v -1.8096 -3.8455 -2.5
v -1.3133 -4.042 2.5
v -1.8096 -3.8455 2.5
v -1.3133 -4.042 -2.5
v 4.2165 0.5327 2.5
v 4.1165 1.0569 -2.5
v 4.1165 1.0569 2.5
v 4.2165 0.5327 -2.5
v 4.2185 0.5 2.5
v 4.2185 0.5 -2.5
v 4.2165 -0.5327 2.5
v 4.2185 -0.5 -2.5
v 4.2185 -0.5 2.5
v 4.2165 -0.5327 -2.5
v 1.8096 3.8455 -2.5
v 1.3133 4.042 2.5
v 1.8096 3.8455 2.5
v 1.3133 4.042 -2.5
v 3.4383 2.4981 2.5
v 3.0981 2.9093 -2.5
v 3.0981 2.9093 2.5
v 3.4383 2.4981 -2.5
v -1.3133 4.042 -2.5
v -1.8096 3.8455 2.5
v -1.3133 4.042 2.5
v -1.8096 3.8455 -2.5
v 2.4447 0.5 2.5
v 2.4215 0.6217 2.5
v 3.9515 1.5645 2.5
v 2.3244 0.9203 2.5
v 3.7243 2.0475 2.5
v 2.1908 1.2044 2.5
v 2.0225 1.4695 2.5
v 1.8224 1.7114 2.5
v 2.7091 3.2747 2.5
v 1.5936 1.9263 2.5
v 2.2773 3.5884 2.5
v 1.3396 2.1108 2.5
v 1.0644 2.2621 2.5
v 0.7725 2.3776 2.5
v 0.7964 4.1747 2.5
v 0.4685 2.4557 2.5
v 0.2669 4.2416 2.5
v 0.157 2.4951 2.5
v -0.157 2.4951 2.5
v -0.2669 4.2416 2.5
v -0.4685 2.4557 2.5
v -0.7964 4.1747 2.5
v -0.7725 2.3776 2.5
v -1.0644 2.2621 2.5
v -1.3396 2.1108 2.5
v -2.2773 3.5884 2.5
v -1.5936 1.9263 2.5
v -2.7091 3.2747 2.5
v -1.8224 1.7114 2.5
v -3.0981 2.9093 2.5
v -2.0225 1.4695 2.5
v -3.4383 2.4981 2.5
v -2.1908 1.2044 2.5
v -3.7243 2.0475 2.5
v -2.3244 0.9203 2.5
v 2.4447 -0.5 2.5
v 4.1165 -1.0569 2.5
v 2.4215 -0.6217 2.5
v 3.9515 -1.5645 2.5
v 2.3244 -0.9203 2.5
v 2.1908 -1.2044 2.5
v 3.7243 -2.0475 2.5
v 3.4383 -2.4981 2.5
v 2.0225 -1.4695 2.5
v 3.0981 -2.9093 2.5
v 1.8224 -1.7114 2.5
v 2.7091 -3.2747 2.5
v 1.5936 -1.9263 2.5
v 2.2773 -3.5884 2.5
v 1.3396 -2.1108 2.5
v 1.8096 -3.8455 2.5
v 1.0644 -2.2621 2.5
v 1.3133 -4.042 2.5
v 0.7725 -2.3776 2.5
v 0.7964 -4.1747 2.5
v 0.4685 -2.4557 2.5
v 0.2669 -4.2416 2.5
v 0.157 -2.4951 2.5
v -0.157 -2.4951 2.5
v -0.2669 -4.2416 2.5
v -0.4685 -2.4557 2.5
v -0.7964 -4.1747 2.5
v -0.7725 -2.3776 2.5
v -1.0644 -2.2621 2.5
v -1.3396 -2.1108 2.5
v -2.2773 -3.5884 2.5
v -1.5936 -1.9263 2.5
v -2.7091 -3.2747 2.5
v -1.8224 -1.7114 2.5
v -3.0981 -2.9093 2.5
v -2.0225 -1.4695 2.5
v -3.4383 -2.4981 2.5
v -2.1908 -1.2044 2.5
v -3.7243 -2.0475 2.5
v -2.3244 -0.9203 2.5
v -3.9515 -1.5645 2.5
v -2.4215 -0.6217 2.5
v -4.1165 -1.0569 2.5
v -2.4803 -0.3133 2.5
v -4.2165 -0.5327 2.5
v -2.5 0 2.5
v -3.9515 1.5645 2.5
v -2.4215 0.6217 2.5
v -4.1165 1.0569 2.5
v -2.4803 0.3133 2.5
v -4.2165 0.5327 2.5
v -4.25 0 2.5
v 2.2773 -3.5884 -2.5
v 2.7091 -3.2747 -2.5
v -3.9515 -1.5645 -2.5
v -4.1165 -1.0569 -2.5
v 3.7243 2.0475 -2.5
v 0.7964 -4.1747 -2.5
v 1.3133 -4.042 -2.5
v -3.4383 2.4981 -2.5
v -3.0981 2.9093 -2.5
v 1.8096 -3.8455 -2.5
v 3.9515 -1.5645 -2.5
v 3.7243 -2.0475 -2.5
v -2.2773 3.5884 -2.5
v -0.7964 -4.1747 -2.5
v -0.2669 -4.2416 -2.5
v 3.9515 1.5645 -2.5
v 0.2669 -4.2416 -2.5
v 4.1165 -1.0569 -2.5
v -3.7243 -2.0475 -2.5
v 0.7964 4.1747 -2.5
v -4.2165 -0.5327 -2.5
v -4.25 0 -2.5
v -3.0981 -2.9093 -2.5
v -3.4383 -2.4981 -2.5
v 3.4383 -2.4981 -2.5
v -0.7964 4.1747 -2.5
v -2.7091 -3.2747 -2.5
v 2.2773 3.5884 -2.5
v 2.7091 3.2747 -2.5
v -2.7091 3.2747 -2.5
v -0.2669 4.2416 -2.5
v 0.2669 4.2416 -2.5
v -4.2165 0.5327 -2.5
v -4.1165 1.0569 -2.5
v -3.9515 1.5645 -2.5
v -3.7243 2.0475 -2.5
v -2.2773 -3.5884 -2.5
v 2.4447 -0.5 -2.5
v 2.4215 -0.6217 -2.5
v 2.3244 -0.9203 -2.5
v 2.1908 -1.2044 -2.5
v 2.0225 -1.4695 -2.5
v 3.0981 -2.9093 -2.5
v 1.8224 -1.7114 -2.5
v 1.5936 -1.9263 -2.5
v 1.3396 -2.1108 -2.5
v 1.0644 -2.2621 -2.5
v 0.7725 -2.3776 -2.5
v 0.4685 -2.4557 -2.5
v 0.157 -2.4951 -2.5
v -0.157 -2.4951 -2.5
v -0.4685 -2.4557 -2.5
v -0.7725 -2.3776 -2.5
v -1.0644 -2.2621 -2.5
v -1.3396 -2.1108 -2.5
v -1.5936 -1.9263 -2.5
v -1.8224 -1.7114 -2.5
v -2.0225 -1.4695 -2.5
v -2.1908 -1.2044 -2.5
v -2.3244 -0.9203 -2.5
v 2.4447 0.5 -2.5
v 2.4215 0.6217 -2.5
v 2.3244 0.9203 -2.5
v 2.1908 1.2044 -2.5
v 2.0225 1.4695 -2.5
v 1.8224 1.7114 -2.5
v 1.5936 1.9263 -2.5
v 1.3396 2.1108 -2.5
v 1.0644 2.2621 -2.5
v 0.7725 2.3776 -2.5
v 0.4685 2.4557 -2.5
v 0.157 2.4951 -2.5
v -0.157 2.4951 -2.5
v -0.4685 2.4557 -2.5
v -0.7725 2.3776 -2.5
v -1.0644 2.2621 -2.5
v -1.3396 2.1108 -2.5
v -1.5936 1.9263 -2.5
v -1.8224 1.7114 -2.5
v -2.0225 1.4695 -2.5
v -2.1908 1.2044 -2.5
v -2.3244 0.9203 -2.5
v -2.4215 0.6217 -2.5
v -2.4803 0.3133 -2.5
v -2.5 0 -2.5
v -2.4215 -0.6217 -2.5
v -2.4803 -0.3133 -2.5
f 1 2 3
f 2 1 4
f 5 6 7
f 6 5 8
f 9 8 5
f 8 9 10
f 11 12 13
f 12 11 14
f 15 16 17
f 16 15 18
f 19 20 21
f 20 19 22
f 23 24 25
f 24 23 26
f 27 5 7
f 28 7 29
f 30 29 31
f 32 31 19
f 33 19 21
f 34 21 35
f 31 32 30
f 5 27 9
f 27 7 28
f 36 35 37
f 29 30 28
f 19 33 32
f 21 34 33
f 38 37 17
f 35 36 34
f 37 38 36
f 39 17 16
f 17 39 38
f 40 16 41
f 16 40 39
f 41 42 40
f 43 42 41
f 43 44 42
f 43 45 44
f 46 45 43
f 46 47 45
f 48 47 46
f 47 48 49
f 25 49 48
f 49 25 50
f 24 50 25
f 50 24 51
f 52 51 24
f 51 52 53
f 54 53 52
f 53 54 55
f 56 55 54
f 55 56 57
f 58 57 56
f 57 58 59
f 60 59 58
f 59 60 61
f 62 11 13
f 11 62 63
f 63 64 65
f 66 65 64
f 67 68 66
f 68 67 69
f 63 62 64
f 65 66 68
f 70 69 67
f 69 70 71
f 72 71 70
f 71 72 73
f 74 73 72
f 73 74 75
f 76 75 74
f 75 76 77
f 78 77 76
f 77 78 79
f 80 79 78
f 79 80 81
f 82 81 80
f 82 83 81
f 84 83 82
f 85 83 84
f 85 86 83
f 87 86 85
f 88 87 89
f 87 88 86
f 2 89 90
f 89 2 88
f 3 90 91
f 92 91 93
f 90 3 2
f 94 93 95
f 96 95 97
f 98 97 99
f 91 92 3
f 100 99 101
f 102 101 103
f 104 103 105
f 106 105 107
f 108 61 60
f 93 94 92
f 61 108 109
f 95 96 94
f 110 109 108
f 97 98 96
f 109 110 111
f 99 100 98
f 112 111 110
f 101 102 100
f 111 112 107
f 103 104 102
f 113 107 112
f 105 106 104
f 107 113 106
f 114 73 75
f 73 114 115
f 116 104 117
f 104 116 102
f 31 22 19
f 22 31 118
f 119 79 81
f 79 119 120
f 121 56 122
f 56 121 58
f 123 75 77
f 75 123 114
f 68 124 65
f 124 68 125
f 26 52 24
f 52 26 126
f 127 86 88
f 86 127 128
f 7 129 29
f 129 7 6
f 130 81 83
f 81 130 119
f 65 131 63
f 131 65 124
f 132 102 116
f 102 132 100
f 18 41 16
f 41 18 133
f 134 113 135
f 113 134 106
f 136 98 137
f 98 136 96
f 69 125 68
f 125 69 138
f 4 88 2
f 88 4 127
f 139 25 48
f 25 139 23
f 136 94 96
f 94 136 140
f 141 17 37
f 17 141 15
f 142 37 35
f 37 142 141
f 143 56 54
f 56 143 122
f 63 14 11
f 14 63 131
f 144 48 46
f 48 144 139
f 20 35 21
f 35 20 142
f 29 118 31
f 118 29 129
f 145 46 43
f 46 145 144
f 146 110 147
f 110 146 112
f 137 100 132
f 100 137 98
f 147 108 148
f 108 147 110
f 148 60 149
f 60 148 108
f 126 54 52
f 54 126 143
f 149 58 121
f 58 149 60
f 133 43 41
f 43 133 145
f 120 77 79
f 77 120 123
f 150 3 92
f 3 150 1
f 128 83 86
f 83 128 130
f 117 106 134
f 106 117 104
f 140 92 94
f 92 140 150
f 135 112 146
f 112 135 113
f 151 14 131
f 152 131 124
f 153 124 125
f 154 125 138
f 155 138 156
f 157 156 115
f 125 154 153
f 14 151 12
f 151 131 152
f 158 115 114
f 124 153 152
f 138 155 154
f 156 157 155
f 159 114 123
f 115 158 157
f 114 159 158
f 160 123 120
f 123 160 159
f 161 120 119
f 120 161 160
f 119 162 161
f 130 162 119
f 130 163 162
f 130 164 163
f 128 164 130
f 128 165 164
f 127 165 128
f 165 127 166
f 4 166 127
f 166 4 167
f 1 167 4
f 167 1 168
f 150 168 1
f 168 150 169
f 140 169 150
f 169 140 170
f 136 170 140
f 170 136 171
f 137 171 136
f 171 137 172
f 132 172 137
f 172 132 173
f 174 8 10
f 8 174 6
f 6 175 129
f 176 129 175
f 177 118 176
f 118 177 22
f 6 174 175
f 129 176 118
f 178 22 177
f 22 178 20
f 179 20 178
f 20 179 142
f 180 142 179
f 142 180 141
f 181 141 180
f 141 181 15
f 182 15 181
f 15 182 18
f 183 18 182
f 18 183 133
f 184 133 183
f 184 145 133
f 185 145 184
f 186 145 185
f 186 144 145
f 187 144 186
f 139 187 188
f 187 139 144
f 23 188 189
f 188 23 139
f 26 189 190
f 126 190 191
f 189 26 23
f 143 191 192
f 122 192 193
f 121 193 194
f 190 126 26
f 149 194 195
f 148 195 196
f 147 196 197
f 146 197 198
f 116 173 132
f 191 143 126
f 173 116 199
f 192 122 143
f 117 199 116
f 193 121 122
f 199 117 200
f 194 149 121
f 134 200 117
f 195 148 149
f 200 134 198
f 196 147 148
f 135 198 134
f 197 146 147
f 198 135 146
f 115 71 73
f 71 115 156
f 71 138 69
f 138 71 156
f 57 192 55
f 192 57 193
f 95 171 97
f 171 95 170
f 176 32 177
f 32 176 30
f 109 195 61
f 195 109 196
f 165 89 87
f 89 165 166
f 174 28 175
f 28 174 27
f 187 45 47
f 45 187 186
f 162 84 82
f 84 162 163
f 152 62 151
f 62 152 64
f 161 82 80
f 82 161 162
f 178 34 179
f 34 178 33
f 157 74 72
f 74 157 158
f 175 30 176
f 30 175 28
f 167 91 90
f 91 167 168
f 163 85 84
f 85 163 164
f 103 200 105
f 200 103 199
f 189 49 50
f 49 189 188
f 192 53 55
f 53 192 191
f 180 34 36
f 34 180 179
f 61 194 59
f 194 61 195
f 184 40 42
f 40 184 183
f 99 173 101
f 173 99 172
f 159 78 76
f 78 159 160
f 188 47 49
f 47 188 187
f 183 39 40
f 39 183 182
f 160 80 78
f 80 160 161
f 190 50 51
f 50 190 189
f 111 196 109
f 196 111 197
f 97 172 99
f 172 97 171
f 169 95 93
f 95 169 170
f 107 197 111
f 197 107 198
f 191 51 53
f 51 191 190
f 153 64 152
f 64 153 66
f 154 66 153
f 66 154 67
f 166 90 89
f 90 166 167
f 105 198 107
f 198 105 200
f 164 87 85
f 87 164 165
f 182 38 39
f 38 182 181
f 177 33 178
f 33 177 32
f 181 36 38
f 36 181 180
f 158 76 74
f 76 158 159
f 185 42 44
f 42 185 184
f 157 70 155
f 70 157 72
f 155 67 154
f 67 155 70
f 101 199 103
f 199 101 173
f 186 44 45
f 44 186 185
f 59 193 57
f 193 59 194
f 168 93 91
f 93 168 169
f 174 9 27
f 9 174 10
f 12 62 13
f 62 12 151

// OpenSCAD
// Singer Spool Holder Clamp
// by zeus - zeus@ctdo.de - 2014-12-11


// Parameters are in mm

// Inner Diameter
id=5; // 5 is good for the Singer Professional XL1000
// Outer Diameter
od=8.5; // 8.5 Gives enought Material thickness when id is "5"
// Width of the cut
cut_w=1; // Increase when your Printer is very sloppy and almost fills this gap
// Height
h=5; //Height of the Clamp

$fn=050;


difference(){
	cylinder(h=h, r=od/2, center=true);
	cylinder(h=h+0.1, r=id/2, center=true);
	translate([od/2-cut_w,0,0]){
		#cube([od/2,cut_w,h+0.1],center=true);
	}
}
